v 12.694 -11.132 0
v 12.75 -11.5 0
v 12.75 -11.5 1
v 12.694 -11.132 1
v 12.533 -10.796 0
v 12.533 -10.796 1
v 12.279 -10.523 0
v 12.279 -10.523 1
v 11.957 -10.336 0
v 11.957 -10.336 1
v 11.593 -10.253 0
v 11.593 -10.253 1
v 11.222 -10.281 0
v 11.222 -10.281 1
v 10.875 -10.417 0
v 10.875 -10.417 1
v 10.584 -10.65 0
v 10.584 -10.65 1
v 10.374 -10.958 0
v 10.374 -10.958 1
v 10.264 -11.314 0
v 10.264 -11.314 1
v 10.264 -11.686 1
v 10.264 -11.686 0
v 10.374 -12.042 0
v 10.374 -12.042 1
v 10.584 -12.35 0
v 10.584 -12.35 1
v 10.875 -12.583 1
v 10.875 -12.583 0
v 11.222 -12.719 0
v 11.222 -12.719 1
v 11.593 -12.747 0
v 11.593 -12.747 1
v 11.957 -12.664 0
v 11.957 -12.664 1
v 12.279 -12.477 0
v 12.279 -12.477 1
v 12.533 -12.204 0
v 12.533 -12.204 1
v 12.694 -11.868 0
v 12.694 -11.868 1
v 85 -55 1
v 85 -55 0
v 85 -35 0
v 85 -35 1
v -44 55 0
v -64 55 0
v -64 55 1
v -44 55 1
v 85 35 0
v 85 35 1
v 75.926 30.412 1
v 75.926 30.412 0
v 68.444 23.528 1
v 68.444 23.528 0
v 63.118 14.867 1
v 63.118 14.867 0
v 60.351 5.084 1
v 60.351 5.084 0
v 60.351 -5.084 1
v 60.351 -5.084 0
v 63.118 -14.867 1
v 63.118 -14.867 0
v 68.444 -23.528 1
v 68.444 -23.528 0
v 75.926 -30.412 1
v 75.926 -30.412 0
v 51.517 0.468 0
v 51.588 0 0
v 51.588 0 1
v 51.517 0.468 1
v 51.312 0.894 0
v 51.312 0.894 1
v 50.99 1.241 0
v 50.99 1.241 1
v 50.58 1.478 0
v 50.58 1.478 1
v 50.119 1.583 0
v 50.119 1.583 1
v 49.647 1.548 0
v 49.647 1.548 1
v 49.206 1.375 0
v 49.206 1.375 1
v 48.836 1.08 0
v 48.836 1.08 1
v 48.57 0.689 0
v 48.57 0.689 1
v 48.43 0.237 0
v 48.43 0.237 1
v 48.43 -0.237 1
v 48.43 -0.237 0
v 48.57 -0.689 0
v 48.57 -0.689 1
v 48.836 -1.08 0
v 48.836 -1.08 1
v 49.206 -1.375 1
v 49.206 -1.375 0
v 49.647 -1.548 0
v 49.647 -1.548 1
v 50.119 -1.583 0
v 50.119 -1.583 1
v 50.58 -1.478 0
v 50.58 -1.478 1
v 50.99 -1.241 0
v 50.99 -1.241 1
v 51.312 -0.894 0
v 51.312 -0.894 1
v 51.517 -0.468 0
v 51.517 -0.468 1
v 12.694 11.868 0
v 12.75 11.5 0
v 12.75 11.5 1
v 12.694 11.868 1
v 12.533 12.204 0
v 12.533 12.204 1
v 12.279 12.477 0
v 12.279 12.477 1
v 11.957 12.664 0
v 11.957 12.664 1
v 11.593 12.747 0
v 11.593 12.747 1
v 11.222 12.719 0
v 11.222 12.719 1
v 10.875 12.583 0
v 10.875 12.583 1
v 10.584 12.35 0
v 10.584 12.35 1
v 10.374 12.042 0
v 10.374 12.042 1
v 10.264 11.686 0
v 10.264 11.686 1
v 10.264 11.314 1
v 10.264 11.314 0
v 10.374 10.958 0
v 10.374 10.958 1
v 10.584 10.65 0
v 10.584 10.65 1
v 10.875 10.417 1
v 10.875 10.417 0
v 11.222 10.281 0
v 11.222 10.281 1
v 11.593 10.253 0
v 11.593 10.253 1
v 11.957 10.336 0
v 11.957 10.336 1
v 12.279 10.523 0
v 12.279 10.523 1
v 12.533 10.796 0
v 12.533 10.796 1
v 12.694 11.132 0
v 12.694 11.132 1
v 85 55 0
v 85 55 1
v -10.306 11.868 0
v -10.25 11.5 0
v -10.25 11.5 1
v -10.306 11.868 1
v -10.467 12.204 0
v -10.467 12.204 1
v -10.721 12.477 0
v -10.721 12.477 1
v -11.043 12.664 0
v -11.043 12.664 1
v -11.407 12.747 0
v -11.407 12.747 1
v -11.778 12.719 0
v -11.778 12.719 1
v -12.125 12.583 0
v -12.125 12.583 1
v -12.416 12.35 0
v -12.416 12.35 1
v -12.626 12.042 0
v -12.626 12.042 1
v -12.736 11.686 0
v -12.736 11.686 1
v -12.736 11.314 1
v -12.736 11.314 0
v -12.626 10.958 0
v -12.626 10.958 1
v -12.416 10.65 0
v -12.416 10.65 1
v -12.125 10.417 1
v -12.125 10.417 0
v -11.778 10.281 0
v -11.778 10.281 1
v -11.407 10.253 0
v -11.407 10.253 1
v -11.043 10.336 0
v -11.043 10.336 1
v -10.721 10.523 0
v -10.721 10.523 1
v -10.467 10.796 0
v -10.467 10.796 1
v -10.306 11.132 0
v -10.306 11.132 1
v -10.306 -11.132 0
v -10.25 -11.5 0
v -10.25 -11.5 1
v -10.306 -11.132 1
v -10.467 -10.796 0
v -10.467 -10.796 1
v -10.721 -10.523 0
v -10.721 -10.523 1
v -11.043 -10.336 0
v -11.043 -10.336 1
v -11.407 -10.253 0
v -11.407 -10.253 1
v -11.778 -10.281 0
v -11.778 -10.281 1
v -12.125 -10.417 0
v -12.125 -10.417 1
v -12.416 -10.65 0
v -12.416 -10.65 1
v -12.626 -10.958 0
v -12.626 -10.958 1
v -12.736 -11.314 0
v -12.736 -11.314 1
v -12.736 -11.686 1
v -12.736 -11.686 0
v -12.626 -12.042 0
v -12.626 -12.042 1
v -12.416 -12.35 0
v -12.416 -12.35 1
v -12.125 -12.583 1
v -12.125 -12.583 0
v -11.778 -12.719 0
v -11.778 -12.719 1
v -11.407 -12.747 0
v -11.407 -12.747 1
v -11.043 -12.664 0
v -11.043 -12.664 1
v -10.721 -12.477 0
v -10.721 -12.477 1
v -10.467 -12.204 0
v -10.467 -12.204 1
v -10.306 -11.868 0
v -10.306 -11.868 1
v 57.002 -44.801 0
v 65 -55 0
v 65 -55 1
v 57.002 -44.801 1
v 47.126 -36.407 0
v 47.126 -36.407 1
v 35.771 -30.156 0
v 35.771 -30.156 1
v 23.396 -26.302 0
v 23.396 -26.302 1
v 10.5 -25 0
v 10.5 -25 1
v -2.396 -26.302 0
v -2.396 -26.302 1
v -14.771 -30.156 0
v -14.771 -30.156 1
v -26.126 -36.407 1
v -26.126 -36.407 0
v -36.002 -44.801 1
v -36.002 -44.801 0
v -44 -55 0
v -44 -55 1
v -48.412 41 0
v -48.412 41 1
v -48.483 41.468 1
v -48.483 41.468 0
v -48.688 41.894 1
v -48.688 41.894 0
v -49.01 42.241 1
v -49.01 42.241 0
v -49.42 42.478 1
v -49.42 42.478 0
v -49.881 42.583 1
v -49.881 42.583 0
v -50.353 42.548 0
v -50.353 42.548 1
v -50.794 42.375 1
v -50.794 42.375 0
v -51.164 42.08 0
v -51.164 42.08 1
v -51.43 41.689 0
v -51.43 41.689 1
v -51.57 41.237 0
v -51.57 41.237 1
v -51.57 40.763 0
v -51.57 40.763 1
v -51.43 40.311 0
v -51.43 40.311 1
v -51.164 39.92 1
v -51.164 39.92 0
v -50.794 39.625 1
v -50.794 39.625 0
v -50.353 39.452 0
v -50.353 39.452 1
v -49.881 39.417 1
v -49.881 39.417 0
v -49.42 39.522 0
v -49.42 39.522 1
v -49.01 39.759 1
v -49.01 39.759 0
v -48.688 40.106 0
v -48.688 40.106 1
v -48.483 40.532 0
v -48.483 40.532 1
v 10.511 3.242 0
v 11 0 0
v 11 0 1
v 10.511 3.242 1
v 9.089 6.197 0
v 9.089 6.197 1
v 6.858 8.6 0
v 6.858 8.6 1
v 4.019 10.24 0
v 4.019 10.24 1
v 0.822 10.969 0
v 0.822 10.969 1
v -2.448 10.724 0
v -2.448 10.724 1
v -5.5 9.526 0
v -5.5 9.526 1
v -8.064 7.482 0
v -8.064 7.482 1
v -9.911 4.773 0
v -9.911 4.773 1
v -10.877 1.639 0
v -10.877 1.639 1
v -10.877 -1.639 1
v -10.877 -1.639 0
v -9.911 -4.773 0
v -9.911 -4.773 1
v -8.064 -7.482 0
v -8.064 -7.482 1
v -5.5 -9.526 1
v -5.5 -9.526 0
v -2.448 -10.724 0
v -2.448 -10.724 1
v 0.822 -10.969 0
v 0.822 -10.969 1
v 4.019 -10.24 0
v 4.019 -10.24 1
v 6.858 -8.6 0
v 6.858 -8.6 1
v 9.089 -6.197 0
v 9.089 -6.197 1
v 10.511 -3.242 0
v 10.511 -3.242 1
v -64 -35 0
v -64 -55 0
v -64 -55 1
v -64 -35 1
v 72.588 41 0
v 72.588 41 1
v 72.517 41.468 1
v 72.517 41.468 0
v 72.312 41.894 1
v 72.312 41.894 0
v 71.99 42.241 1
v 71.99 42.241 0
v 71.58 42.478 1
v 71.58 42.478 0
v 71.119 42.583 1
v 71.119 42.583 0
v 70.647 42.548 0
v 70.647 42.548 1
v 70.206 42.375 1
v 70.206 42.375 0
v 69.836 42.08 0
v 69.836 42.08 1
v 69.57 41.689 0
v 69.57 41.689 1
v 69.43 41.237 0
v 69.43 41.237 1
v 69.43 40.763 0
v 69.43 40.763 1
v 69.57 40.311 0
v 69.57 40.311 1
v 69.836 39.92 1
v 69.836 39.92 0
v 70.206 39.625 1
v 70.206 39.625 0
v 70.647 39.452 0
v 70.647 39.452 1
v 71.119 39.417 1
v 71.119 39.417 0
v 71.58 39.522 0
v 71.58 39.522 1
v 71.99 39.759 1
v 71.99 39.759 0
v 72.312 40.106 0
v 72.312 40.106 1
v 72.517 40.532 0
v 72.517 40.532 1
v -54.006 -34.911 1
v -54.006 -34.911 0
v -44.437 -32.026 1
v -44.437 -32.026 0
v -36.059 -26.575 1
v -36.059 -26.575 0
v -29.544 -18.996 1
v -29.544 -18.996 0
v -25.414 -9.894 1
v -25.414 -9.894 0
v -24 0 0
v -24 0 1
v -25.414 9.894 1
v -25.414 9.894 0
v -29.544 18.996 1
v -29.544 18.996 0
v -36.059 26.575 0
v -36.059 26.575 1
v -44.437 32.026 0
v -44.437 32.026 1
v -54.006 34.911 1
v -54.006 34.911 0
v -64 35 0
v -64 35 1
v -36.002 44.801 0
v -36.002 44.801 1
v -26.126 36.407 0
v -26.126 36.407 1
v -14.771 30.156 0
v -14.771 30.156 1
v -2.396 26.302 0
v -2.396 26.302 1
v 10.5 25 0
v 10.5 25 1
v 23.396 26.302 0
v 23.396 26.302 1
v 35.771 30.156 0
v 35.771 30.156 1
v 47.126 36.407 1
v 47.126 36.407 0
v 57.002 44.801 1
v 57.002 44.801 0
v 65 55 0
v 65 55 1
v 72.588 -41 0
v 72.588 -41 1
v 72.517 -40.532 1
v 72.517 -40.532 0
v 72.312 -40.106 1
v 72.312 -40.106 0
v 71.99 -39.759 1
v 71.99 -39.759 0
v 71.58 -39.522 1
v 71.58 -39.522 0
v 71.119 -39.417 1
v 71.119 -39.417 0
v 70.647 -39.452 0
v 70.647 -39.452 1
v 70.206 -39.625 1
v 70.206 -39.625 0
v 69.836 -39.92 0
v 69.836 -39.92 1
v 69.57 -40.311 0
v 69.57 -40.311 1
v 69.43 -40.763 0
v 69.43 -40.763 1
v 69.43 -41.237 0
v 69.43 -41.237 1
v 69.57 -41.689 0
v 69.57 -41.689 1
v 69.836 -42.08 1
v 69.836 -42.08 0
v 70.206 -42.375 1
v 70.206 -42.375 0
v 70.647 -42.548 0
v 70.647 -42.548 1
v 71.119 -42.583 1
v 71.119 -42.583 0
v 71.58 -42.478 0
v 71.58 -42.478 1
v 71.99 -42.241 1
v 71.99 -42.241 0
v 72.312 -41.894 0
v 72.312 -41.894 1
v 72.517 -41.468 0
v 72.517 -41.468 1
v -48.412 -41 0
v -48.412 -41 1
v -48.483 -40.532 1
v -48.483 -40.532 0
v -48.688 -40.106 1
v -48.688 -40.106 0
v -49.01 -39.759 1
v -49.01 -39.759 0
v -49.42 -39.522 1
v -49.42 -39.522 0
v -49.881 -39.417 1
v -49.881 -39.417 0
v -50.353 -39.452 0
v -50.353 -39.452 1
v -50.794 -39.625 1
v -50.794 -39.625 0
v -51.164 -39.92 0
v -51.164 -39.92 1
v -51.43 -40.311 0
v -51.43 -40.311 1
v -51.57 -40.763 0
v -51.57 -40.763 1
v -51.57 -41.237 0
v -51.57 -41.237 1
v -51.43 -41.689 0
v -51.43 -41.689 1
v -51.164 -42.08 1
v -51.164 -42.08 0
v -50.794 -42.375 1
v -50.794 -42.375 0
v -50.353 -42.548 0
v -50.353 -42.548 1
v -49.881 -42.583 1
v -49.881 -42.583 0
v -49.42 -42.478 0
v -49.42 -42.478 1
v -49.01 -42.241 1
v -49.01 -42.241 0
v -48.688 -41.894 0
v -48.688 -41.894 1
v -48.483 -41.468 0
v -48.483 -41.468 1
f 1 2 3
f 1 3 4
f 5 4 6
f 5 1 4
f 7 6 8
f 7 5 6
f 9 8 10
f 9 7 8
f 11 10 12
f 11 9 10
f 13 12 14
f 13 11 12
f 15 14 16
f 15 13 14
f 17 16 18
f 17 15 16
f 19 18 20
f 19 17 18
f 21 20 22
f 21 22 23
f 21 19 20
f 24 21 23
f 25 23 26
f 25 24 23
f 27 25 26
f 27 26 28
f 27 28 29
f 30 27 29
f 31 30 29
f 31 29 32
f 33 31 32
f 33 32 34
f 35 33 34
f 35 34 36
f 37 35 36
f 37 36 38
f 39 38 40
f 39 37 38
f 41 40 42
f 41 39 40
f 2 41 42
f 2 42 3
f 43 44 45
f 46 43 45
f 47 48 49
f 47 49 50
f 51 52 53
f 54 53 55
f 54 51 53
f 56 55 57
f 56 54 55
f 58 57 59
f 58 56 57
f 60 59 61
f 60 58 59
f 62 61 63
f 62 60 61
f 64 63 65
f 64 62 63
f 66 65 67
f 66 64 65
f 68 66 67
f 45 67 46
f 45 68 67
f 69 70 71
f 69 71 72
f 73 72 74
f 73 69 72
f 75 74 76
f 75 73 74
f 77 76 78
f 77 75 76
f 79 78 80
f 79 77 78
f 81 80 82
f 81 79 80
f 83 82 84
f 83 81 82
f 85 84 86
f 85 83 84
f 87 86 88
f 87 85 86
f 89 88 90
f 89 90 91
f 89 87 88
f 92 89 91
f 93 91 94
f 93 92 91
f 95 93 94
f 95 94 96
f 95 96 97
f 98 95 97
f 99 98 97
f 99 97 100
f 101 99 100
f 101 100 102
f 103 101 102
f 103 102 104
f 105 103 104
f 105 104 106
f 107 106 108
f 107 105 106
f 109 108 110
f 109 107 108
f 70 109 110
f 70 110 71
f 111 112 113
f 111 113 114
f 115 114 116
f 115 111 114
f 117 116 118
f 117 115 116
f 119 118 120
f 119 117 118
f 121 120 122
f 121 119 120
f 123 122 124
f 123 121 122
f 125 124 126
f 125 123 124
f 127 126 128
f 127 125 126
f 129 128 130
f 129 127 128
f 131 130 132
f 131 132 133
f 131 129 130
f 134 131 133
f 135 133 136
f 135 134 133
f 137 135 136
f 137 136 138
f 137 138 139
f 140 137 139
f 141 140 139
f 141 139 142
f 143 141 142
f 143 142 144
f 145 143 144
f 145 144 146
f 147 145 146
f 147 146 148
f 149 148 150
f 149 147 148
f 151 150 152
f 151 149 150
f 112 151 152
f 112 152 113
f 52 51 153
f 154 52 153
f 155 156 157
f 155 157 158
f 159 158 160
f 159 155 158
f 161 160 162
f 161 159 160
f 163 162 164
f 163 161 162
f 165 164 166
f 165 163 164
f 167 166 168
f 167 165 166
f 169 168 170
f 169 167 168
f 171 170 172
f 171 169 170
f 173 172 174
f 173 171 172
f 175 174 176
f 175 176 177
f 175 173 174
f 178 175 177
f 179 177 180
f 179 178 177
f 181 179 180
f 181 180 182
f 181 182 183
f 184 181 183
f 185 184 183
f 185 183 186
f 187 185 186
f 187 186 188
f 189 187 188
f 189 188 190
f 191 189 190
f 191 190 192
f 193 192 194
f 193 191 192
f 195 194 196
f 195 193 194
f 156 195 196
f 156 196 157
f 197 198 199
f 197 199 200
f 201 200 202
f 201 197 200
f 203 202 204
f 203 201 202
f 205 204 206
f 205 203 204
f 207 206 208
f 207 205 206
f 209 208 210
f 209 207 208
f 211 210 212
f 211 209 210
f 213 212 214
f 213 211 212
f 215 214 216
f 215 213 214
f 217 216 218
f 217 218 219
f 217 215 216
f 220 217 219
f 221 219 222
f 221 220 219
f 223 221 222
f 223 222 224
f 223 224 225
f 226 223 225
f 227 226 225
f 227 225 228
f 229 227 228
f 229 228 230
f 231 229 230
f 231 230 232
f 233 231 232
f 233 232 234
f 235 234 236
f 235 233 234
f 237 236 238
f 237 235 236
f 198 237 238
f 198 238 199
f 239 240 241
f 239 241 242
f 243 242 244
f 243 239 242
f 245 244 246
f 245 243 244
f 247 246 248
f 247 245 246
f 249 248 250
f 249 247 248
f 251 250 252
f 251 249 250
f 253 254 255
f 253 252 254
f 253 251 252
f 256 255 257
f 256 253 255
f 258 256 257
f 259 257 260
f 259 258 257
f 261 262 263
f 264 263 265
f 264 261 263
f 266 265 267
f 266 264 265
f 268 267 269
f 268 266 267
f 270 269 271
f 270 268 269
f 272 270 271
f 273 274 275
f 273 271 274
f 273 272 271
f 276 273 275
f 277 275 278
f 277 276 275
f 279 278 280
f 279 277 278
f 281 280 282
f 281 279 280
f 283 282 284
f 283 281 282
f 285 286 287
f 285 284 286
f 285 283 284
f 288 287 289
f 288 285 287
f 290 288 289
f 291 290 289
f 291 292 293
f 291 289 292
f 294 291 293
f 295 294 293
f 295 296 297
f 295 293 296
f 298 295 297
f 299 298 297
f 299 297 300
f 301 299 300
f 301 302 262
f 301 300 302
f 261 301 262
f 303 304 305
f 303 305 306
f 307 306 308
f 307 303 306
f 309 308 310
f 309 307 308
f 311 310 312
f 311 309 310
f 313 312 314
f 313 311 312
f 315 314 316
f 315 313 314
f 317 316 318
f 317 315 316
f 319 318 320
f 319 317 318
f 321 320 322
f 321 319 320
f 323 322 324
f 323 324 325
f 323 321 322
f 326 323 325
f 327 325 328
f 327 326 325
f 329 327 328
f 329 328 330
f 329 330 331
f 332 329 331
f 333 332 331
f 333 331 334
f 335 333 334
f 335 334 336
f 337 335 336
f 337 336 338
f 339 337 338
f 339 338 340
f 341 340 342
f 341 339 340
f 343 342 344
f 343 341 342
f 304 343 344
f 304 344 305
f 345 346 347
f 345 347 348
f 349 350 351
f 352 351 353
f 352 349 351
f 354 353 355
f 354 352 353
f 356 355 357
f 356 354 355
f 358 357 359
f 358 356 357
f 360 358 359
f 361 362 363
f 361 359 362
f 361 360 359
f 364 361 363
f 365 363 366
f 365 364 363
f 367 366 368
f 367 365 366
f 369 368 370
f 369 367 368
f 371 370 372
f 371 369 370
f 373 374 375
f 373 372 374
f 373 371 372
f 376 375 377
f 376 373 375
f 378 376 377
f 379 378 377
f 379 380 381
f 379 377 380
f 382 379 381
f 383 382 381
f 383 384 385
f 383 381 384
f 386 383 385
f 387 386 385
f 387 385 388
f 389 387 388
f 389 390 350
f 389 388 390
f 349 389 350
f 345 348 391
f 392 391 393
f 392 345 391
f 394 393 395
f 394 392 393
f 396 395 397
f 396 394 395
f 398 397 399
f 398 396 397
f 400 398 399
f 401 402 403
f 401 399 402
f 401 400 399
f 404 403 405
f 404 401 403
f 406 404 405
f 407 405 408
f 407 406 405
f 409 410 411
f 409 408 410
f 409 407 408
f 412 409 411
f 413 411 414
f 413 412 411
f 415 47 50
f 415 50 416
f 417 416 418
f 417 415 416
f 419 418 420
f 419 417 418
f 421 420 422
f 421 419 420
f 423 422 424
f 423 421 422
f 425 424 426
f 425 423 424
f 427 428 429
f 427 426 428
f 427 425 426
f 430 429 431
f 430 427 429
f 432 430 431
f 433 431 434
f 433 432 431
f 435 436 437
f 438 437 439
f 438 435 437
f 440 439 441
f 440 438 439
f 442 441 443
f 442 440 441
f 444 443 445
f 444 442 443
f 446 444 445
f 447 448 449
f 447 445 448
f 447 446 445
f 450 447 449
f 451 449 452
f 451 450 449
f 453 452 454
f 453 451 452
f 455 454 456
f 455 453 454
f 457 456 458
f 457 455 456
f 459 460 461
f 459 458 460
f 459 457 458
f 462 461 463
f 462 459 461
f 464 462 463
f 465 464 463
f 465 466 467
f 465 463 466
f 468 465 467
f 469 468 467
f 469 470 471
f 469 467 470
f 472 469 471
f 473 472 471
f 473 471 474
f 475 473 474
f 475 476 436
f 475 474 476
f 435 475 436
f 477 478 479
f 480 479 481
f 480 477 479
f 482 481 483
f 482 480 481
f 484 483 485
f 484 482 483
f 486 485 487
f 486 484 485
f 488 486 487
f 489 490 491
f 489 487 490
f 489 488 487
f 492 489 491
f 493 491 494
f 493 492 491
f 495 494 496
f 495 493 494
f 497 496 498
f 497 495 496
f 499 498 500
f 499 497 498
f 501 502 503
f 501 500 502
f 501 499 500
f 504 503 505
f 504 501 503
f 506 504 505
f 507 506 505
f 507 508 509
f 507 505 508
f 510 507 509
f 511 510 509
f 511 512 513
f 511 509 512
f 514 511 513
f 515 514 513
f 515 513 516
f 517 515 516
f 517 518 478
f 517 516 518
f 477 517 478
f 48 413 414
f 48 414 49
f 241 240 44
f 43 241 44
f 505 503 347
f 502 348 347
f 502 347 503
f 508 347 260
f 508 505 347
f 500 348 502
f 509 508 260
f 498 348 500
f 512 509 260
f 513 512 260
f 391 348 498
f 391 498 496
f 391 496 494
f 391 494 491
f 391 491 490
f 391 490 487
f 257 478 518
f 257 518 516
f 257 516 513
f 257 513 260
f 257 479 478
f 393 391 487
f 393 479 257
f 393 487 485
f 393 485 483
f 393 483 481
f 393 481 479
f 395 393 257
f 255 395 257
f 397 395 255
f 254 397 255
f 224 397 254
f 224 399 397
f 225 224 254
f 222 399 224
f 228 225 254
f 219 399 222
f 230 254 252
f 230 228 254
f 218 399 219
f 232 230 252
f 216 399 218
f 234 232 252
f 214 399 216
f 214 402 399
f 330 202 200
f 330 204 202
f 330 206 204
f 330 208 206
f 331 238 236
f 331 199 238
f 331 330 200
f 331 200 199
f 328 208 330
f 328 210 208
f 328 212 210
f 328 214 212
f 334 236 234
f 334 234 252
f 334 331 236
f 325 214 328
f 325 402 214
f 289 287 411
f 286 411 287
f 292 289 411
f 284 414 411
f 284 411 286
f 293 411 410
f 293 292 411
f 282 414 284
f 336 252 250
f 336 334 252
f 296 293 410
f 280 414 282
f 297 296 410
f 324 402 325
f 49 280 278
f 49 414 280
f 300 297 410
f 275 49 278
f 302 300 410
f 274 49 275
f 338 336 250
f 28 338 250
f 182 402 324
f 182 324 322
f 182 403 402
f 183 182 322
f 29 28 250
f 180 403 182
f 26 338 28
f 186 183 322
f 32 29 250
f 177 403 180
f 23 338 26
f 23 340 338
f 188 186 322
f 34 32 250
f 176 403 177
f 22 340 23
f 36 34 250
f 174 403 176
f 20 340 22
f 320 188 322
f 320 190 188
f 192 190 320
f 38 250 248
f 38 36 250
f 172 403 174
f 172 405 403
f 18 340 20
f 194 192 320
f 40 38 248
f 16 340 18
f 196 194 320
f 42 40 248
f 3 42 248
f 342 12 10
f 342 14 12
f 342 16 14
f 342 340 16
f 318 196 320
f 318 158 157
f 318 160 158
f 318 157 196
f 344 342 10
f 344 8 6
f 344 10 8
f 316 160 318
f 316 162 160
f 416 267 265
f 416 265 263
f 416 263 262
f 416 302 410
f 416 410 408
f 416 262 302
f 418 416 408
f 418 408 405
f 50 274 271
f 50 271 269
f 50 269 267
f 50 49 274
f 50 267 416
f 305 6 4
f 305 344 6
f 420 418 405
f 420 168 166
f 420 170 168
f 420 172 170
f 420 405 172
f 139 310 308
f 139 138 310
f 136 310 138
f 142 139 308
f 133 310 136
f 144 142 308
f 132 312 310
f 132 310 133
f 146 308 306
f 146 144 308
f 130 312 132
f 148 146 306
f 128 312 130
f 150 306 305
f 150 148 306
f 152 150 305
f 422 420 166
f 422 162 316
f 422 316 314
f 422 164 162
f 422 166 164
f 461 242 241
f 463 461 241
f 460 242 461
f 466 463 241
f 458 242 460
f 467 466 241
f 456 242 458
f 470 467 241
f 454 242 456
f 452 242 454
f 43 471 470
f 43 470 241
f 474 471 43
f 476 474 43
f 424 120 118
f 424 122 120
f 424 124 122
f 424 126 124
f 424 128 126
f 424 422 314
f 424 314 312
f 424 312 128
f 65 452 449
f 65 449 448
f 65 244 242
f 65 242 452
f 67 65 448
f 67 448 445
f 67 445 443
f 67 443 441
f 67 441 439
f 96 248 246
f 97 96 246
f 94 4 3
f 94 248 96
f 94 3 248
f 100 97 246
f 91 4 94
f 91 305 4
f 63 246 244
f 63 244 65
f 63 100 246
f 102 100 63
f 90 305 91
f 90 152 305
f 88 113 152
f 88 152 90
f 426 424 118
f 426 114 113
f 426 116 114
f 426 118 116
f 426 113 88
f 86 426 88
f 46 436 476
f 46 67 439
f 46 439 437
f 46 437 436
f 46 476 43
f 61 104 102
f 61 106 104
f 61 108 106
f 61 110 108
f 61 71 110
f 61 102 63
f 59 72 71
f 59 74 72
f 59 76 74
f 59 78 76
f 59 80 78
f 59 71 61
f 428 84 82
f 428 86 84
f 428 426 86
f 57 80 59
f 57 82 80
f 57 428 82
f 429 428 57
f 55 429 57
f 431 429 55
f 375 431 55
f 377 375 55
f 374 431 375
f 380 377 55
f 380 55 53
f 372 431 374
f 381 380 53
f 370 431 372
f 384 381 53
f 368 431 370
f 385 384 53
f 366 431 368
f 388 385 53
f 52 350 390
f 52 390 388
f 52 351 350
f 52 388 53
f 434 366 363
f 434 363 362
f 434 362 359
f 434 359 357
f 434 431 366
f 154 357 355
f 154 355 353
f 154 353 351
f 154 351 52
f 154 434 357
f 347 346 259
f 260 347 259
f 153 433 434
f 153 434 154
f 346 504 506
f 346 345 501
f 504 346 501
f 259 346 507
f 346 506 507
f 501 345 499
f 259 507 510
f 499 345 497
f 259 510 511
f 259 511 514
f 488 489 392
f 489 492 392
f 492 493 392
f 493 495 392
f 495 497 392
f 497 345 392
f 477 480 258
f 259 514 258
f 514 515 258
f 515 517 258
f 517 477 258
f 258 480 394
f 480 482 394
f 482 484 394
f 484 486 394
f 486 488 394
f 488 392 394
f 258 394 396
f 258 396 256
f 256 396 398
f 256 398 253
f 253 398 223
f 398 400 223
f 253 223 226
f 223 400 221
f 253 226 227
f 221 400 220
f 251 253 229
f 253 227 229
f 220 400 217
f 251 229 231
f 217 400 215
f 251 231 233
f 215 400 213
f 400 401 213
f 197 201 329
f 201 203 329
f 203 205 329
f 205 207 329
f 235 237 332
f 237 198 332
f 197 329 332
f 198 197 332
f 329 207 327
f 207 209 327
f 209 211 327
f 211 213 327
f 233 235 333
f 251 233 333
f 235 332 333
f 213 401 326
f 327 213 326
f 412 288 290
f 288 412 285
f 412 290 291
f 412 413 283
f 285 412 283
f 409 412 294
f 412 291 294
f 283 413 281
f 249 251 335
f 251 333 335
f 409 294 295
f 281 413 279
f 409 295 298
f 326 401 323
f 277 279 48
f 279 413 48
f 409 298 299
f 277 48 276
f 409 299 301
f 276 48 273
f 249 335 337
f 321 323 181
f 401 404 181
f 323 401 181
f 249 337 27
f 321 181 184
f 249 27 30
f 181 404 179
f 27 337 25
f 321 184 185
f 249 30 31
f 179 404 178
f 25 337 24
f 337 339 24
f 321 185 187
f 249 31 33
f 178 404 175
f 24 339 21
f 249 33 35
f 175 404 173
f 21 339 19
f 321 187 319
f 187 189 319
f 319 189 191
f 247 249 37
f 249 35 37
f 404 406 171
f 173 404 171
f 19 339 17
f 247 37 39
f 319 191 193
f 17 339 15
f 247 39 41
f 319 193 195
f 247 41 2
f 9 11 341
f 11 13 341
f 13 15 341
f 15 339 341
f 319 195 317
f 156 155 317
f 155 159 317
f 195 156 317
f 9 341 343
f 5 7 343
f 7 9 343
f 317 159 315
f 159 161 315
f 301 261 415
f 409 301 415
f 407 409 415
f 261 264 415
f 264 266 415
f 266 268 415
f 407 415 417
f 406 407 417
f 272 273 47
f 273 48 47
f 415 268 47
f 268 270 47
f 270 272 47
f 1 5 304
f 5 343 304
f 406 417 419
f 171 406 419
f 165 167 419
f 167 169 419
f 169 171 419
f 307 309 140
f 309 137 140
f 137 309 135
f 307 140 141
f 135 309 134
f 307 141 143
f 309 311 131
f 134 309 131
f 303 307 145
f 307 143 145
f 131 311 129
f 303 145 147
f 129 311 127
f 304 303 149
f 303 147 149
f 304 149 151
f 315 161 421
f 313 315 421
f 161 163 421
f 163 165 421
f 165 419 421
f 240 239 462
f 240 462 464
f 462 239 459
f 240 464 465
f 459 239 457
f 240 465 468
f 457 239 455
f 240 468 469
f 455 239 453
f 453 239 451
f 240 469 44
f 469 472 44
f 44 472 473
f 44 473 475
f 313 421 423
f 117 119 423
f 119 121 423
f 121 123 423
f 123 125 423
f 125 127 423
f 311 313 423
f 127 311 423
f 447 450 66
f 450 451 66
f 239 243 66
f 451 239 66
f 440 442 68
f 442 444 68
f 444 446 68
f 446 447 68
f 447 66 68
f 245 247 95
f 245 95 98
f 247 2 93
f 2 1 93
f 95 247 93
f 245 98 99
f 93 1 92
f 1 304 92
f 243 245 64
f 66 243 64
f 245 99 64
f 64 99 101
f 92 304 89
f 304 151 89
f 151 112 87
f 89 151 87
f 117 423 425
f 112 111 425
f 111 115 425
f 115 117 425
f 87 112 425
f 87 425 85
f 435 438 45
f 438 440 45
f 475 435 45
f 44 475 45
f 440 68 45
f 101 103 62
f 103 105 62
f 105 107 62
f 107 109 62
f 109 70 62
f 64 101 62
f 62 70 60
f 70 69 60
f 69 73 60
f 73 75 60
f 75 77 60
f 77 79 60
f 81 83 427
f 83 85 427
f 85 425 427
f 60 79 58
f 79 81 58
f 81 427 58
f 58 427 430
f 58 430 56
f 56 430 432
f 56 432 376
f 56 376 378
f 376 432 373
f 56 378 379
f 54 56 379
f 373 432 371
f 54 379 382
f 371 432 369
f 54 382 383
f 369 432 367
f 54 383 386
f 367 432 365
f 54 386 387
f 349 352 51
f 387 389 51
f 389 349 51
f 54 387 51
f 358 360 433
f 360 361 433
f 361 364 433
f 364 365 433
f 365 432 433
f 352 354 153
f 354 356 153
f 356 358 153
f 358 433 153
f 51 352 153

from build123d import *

# Parameters (mm, degrees)
F0_R      = 110
F0_R_2    = 1.25
F0_R_3    = 11
F0_R_4    = 1.5875
F1_DEPTH  = 1
F2_R      = 110
F2_W      = 150
F2_H      = 90
F3_DEPTH  = 1.001
F4_R      = 1.5875
F5_DEPTH  = 1.001
F6_W      = 21
F6_H      = 90
F7_DEPTH  = 1.001
F8_W      = 149
F8_H      = 110
F8_W_2    = 129
F8_H_2    = 90
F9_DEPTH  = 1
F11_DEPTH = 25


with BuildPart() as f1:
    # F0 (on Top) → F1 (new body)
    with BuildSketch(Plane.XY):
        Circle(F0_R)
        with Locations((-11.5, -11.5)):
            Circle(F0_R_2, mode=Mode.SUBTRACT)
        with Locations((11.5, -11.5)):
            Circle(F0_R_2, mode=Mode.SUBTRACT)
        with Locations((-11.5, 11.5)):
            Circle(F0_R_2, mode=Mode.SUBTRACT)
        Circle(F0_R_3, mode=Mode.SUBTRACT)
        with Locations((11.5, 11.5)):
            Circle(F0_R_2, mode=Mode.SUBTRACT)
        with Locations((50, 0)):
            Circle(F0_R_4, mode=Mode.SUBTRACT)
    extrude(amount=F1_DEPTH)

    # F2 (on Top) → F3 (cut, through all)
    with BuildSketch(Plane.XY):
        Circle(F2_R)
        Rectangle(F2_W, F2_H, mode=Mode.SUBTRACT)
    extrude(amount=F3_DEPTH, mode=Mode.SUBTRACT)

    # F4 (on Top) → F5 (cut, through all)
    with BuildSketch(Plane.XY):
        with Locations((-50, 41)):
            Circle(F4_R)
        with Locations((-50, -41)):
            Circle(F4_R)
        with Locations((71, -41)):
            Circle(F4_R)
        with Locations((71, 41)):
            Circle(F4_R)
    extrude(amount=F5_DEPTH, mode=Mode.SUBTRACT)

    # F6 (on Top) → F7 (cut, through all)
    with BuildSketch(Plane.XY):
        with Locations((-64.5, 0)):
            Rectangle(F6_W, F6_H)
    extrude(amount=F7_DEPTH, mode=Mode.SUBTRACT)

    # F8 (on Top) → F9 (join, through all)
    with BuildSketch(Plane.XY):
        with Locations((10.5, 0)):
            Rectangle(F8_W, F8_H)
        with Locations((10.5, 0)):
            Rectangle(F8_W_2, F8_H_2, mode=Mode.SUBTRACT)
    extrude(amount=F9_DEPTH)

    # F10 (on Top) → F11 (cut)
    with BuildSketch(Plane.XY):
        with BuildLine():
            Line((65, 55), (-44, 55))
            ThreePointArc((-44, 55), (10.5, 25), (65, 55))
        make_face()
        with BuildLine():
            ThreePointArc((-64, -35), (-24, 0), (-64, 35))
            Line((-64, 35), (-64, -35))
        make_face()
        with BuildLine():
            ThreePointArc((65, -55), (10.5, -25), (-44, -55))
            Line((-44, -55), (65, -55))
        make_face()
        with BuildLine():
            Line((85, -35), (85, 35))
            ThreePointArc((85, 35), (60, 0), (85, -35))
        make_face()
    extrude(amount=F11_DEPTH, mode=Mode.SUBTRACT)


solid = f1.part
